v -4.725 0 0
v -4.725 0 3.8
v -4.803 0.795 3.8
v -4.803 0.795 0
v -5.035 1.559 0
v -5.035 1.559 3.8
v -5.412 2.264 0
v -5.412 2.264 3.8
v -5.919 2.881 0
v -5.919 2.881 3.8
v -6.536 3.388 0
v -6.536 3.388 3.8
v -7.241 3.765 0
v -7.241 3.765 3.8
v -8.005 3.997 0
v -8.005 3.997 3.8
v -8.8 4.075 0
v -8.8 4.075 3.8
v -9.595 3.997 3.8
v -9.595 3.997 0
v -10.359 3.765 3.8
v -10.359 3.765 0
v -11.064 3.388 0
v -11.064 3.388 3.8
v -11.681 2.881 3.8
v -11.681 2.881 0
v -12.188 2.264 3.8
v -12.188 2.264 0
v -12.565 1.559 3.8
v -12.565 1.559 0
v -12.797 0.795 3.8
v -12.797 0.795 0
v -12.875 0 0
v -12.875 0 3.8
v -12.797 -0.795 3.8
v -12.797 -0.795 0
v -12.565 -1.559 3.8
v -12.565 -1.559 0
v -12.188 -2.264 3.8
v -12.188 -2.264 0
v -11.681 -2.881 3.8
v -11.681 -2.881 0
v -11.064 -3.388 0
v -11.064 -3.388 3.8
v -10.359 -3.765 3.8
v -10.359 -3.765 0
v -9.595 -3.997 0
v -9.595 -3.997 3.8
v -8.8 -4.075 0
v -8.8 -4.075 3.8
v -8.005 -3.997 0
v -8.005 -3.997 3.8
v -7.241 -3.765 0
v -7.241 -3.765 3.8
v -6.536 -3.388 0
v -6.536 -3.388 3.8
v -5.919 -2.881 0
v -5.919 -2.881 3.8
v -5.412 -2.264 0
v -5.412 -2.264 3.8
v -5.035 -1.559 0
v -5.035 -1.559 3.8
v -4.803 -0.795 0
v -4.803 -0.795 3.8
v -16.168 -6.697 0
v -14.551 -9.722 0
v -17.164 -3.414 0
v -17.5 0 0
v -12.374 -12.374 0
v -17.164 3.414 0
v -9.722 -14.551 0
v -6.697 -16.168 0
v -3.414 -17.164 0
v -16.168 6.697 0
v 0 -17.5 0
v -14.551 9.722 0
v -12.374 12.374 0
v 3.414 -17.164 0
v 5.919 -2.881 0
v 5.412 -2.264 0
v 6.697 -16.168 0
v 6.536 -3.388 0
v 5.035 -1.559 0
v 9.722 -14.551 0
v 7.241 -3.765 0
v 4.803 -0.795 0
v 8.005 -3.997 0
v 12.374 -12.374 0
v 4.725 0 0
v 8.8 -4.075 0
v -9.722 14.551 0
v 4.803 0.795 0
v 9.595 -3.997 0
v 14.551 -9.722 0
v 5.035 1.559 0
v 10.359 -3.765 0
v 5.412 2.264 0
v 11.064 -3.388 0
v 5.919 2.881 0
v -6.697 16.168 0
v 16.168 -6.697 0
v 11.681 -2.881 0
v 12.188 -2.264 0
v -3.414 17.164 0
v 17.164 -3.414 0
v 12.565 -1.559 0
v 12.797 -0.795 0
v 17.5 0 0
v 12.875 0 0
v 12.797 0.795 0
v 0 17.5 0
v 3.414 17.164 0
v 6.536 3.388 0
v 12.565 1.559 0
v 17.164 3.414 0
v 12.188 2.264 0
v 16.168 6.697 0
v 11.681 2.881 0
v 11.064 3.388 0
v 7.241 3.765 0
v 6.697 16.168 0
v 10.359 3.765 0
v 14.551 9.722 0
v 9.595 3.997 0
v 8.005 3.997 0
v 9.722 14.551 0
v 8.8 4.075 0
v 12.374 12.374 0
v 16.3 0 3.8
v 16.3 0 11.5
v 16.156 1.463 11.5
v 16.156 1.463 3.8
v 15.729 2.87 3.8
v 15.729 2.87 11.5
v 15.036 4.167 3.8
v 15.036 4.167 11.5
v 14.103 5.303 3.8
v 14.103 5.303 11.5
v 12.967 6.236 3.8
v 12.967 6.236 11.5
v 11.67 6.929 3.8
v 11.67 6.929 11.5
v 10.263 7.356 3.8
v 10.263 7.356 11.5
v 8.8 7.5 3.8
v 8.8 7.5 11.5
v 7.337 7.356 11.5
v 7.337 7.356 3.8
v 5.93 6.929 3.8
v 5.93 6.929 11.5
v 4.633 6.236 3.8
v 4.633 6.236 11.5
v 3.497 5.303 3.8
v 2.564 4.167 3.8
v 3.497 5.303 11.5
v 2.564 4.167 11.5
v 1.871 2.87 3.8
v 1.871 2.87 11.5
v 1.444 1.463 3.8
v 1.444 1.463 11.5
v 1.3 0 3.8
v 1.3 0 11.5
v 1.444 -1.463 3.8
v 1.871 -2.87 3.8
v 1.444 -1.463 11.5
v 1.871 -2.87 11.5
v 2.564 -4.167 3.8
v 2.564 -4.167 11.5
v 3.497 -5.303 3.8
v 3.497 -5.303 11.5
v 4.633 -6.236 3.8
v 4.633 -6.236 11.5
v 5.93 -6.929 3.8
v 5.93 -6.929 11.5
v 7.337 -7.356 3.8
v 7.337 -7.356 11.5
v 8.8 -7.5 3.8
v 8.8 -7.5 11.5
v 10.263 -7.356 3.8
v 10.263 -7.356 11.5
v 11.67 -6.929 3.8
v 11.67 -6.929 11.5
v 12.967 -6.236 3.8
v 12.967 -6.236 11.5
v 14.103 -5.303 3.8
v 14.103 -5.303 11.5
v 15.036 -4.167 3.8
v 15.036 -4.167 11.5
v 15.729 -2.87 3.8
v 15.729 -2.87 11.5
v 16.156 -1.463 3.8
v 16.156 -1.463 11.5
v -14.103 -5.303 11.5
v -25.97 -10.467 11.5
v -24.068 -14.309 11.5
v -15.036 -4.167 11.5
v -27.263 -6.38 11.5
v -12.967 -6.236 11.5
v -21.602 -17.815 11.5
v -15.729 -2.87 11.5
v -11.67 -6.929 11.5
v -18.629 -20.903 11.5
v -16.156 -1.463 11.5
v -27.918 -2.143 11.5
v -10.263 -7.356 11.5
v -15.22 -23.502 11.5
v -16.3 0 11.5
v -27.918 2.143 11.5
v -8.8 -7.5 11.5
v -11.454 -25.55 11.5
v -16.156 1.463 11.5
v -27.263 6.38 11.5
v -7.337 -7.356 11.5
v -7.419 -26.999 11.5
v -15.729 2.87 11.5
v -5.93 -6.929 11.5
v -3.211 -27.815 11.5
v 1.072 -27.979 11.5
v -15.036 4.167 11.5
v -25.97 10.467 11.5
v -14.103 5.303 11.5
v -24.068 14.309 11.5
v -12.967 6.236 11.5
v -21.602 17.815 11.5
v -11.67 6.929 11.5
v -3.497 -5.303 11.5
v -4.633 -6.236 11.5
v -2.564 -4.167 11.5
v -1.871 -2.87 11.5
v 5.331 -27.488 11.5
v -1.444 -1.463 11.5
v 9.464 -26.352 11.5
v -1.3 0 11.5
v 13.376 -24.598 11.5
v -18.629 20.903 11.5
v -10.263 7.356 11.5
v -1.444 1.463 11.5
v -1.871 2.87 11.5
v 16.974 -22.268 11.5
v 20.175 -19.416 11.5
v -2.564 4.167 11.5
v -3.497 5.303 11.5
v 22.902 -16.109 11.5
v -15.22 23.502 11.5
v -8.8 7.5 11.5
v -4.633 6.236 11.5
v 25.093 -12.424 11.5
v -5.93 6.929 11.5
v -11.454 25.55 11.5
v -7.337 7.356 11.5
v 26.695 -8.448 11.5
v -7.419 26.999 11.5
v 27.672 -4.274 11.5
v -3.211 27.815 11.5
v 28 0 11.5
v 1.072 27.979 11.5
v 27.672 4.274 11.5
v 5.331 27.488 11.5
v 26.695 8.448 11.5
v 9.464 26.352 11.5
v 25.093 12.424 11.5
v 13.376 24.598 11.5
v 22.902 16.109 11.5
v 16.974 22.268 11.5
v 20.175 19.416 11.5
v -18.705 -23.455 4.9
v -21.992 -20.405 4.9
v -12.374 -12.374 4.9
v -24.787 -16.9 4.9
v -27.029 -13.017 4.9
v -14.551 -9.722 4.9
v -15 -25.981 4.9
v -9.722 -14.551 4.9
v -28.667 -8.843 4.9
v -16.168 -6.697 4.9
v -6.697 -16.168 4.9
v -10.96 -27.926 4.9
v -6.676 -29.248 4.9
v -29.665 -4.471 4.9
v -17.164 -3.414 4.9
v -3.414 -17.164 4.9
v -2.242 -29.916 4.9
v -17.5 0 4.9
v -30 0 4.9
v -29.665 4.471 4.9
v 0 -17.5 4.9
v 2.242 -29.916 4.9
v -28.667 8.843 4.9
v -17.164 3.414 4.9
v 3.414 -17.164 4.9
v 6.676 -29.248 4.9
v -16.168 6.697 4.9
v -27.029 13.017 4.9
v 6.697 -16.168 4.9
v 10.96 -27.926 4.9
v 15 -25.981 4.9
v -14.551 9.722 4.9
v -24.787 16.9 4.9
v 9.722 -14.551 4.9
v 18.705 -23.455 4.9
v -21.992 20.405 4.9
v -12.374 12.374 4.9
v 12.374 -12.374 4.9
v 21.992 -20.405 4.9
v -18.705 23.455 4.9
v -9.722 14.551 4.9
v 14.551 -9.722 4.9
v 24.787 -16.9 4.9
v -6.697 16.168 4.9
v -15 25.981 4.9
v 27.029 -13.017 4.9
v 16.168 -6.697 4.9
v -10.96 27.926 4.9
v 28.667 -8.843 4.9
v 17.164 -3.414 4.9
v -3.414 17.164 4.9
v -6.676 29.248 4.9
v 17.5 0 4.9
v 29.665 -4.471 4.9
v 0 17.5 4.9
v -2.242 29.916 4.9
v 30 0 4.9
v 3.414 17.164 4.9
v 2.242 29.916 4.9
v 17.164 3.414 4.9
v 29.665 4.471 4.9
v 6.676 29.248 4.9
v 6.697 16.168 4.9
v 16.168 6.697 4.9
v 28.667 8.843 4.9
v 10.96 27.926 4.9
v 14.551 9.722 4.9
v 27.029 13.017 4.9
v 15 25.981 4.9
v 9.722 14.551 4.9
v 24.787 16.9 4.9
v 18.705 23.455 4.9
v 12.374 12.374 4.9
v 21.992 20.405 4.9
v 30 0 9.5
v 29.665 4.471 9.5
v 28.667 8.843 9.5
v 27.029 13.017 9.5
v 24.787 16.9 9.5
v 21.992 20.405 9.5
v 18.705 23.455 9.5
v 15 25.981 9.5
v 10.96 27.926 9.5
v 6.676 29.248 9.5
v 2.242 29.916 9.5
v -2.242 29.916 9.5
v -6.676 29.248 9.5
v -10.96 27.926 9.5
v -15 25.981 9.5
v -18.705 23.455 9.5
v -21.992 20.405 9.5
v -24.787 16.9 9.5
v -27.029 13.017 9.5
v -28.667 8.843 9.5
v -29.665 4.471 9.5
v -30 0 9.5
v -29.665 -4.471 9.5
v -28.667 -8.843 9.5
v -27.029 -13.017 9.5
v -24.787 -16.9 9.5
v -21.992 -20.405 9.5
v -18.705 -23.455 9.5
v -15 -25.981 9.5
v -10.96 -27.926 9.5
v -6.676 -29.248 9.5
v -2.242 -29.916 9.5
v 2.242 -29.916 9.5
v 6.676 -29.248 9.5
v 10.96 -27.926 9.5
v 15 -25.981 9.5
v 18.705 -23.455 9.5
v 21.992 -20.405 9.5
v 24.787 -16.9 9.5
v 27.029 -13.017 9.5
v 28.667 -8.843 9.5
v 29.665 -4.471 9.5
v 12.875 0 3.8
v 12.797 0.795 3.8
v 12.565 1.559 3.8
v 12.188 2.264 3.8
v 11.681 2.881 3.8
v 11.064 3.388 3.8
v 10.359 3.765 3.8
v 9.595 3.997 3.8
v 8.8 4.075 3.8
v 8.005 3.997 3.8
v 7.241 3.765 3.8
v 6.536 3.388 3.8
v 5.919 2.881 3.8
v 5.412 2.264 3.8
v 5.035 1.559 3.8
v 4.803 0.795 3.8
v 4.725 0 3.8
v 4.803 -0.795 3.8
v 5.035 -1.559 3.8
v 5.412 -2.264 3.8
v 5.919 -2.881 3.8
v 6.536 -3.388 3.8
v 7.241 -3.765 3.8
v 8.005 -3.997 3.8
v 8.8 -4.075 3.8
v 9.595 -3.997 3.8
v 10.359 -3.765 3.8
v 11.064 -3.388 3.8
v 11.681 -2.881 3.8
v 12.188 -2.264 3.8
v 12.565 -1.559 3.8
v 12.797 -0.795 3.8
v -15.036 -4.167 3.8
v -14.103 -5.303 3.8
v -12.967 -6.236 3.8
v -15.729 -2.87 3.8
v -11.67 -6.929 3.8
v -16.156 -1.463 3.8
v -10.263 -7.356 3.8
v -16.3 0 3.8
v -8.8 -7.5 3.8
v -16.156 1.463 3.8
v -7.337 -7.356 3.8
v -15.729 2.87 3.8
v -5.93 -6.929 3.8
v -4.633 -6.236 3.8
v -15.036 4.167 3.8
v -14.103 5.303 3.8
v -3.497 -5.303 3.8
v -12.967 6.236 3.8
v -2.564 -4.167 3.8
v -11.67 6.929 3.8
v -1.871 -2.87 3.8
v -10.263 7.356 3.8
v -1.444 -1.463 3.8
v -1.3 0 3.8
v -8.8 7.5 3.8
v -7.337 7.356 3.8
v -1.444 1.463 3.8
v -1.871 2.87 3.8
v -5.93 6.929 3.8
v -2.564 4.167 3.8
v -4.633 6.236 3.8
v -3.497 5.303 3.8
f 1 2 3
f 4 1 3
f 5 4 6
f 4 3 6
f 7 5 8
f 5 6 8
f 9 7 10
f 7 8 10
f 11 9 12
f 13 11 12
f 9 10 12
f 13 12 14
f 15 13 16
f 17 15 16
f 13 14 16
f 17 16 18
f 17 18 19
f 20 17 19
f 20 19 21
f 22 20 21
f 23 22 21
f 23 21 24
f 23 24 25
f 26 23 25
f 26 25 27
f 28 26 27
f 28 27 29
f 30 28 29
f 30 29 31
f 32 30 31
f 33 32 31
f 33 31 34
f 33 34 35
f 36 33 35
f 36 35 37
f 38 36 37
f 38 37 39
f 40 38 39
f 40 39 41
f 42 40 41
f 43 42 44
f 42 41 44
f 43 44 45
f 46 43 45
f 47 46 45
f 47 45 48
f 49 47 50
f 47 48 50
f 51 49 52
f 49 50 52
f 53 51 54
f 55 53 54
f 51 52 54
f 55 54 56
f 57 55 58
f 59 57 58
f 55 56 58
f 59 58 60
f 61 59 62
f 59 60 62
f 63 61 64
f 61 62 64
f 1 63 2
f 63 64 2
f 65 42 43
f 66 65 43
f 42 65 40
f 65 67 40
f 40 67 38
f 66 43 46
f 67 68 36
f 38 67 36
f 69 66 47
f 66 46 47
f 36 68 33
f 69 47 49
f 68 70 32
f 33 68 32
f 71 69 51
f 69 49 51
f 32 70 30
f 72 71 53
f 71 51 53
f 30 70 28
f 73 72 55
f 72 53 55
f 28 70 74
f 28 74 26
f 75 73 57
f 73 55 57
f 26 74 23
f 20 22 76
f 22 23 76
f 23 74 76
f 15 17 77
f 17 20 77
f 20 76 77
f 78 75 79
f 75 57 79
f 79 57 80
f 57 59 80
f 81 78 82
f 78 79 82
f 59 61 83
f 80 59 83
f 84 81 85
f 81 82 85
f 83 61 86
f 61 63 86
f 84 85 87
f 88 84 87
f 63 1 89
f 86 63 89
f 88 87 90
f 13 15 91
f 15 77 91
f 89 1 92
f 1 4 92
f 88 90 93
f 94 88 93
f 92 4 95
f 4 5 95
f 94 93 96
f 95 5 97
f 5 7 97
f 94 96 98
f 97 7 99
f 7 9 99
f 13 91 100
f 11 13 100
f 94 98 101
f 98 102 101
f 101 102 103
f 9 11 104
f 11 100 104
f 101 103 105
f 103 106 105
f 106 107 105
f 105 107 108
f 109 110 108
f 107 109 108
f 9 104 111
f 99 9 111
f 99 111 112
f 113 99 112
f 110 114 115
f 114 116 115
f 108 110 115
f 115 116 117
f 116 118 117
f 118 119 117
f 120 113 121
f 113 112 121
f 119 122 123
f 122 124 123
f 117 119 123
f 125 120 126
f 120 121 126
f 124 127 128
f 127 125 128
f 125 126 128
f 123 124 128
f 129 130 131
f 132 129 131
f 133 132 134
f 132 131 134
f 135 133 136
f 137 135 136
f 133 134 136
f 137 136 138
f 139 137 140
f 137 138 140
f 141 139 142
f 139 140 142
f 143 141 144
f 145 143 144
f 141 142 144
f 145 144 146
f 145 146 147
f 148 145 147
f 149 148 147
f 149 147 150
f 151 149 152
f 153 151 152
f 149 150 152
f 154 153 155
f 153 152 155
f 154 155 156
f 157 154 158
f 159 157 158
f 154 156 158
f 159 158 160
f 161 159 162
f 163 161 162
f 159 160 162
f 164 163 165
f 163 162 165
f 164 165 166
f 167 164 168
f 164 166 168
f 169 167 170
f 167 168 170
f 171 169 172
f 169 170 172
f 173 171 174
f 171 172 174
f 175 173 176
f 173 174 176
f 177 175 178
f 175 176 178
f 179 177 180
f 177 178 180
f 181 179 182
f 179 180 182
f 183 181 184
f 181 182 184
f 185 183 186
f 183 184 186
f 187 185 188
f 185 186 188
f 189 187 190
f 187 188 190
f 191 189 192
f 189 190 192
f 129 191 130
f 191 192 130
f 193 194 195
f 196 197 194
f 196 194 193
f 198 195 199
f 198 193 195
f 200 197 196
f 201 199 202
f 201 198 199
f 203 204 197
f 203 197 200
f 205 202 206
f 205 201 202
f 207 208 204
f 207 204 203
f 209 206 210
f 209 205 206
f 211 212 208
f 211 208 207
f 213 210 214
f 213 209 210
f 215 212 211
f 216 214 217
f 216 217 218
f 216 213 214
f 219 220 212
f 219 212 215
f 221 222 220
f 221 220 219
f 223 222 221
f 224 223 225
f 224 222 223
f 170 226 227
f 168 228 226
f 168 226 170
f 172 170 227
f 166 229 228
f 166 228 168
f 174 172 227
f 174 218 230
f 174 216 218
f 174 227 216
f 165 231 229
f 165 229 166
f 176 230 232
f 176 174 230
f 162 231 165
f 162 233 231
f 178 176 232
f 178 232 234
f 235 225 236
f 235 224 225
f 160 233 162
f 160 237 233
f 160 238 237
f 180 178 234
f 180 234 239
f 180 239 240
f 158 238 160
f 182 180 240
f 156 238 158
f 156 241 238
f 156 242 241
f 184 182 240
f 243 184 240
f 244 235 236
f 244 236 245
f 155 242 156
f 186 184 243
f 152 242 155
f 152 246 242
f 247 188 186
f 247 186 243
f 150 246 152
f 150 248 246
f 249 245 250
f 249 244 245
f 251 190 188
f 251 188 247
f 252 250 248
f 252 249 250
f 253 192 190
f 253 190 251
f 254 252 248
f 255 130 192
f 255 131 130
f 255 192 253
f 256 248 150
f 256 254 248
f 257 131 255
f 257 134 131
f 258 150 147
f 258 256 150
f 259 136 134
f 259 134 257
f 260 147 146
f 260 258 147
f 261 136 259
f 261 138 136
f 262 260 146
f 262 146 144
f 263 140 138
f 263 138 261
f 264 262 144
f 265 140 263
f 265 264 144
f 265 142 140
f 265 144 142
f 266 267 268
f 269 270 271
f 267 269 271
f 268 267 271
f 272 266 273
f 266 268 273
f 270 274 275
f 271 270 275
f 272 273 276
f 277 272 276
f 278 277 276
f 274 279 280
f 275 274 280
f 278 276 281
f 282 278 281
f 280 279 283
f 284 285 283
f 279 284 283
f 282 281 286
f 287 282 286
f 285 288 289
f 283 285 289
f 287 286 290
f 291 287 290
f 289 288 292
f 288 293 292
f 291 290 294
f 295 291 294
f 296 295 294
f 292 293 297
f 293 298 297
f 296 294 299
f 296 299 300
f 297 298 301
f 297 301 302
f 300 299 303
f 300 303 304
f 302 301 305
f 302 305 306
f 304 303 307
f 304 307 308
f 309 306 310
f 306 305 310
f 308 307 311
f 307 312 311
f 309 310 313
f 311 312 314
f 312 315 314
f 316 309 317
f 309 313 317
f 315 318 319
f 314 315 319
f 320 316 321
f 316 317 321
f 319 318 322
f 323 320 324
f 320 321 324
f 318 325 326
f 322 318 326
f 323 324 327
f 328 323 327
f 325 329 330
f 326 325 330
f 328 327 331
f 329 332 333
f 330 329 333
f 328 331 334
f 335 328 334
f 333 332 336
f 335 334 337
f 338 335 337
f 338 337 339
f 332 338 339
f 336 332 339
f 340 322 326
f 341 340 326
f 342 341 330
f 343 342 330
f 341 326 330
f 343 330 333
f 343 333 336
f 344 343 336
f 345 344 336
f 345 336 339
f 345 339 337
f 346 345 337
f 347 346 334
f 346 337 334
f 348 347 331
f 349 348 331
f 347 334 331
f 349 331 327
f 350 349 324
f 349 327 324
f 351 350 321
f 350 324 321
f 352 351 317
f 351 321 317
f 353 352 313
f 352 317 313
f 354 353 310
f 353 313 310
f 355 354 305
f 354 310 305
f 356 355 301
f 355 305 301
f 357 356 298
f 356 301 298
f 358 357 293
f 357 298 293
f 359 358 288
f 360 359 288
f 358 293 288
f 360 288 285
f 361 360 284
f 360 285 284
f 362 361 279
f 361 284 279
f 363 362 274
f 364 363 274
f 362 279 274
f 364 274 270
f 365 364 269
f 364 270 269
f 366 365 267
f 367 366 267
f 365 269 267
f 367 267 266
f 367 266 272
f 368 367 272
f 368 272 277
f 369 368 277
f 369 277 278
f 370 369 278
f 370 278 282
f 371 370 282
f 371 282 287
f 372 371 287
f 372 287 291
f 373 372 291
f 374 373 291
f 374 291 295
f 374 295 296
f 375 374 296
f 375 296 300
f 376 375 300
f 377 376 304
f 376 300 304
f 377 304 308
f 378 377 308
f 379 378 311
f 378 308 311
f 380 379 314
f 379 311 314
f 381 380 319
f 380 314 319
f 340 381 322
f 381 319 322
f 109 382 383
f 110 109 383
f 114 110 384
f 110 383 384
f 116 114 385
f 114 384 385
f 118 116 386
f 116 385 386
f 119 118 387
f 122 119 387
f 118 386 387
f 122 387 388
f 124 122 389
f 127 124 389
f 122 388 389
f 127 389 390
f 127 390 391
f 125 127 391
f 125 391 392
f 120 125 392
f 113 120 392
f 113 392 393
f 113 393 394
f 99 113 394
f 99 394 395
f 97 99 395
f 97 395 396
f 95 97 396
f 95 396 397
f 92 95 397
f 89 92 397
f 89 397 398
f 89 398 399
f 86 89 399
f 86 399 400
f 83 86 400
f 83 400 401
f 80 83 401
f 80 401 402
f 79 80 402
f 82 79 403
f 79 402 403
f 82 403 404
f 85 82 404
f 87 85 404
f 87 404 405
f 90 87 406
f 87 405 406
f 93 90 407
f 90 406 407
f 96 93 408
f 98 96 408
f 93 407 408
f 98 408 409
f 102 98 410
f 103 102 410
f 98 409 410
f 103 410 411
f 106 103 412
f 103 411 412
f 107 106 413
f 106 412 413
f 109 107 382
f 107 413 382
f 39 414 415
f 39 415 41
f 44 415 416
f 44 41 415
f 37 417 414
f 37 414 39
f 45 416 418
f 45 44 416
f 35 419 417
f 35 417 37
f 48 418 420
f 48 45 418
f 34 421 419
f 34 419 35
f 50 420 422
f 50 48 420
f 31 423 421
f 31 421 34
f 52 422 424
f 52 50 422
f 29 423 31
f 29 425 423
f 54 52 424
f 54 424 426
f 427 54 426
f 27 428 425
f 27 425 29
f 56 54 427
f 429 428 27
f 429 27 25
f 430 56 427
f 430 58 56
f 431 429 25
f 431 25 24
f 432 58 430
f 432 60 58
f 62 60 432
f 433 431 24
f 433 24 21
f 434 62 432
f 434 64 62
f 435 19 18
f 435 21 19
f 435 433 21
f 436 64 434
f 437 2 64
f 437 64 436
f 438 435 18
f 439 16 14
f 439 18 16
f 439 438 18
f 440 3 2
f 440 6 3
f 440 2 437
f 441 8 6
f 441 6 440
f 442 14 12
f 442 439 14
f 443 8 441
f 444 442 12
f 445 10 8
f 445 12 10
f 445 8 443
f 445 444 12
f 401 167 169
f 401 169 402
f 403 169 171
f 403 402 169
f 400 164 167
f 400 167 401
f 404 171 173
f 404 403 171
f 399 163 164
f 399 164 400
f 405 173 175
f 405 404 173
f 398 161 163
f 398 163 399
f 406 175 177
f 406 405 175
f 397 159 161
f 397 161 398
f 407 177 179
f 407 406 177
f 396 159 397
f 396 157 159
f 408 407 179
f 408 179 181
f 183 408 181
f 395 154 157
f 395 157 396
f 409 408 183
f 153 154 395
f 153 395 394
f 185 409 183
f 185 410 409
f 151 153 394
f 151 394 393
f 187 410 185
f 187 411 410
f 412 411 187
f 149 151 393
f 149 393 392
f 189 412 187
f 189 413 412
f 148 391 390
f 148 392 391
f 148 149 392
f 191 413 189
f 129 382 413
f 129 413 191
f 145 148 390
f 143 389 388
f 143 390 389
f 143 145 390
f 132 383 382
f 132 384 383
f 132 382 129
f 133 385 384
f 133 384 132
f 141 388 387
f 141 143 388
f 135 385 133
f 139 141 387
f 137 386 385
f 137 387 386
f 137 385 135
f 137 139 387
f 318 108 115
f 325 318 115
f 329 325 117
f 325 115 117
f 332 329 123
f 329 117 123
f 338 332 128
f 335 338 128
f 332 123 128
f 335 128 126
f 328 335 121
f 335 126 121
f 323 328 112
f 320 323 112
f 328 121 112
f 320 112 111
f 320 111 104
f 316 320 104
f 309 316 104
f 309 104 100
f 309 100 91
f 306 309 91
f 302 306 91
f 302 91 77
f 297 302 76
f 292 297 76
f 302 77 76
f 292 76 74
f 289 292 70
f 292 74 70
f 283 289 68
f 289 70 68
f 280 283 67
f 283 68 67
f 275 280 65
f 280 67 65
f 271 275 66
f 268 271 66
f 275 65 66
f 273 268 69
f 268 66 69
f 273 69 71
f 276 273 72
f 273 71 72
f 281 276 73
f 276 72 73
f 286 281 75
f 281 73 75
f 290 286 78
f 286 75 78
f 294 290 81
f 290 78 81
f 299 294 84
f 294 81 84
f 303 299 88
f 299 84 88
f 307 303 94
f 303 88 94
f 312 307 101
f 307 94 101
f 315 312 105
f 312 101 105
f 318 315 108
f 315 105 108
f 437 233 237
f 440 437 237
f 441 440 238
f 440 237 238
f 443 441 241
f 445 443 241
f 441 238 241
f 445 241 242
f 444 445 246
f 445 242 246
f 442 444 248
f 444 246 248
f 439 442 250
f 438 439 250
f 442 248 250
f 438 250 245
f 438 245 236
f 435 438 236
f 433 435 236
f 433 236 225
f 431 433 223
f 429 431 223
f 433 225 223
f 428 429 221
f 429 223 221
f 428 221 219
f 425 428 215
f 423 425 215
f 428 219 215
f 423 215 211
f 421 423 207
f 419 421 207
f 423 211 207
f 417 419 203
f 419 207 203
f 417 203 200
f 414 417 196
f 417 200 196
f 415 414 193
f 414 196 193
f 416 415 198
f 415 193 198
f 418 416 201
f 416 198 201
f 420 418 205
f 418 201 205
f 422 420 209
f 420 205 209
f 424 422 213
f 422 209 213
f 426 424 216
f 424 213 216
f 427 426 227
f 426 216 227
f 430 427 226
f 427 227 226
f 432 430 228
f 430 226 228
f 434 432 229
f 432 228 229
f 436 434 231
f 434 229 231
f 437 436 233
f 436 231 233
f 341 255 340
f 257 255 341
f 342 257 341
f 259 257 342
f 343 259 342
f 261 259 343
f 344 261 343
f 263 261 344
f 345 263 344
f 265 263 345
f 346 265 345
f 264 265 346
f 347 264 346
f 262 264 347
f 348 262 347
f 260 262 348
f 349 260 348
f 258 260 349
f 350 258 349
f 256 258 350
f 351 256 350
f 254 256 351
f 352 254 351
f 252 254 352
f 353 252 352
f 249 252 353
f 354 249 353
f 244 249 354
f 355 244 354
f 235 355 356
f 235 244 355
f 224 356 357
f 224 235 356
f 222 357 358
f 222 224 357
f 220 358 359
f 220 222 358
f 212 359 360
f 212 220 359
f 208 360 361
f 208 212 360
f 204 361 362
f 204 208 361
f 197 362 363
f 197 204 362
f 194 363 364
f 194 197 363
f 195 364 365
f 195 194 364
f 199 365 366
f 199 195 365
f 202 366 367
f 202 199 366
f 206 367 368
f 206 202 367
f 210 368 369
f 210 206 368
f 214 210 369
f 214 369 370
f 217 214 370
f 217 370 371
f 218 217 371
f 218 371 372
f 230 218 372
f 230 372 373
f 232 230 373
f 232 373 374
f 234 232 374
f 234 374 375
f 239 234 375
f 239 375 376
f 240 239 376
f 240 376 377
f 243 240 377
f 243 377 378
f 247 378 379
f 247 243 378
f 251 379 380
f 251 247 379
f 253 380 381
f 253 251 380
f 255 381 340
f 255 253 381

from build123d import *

# Parameters (mm, degrees)
F0_R     = 17.5
F1_DEPTH = 4.9
F2_R     = 30
F3_DEPTH = 6.6
F4_SIZE  = 2
F5_R     = 7.5
F5_R_2   = 4.075
F6_DEPTH = 7.7
F7_DEPTH = 11.501


with BuildPart() as f1:
    # F0 (on Top) → F1 (new body)
    with BuildSketch(Plane.XY):
        Circle(F0_R)
    extrude(amount=F1_DEPTH)

    # F2 (on face) → F3 (join)
    with BuildSketch(Plane.XY.offset(4.9)):
        Circle(F2_R)
    extrude(amount=F3_DEPTH)

    # F4
    f4_edges = [f1.edges().sort_by_distance(p)[0] for p in [
        (-30, 0, 11.5),
    ]]
    chamfer(f4_edges, length=F4_SIZE)

    # F5 (on face) → F6 (cut)
    with BuildSketch(Plane.XY.offset(11.5)):
        with Locations((-8.8, 0)):
            Circle(F5_R)
        with Locations((-8.8, 0)):
            Circle(F5_R_2, mode=Mode.SUBTRACT)
        with Locations((8.8, 0)):
            Circle(F5_R)
        with Locations((8.8, 0)):
            Circle(F5_R_2, mode=Mode.SUBTRACT)
    extrude(amount=-F6_DEPTH, mode=Mode.SUBTRACT)

    # F7 (cut, through all): faces of the model
    f7_faces = [f1.faces().sort_by_distance(p)[0] for p in [
        (-8.8, 0, 11.5),
        (8.8, 0, 11.5),
    ]]
    extrude(f7_faces, amount=-F7_DEPTH, mode=Mode.SUBTRACT)


solid = f1.part
